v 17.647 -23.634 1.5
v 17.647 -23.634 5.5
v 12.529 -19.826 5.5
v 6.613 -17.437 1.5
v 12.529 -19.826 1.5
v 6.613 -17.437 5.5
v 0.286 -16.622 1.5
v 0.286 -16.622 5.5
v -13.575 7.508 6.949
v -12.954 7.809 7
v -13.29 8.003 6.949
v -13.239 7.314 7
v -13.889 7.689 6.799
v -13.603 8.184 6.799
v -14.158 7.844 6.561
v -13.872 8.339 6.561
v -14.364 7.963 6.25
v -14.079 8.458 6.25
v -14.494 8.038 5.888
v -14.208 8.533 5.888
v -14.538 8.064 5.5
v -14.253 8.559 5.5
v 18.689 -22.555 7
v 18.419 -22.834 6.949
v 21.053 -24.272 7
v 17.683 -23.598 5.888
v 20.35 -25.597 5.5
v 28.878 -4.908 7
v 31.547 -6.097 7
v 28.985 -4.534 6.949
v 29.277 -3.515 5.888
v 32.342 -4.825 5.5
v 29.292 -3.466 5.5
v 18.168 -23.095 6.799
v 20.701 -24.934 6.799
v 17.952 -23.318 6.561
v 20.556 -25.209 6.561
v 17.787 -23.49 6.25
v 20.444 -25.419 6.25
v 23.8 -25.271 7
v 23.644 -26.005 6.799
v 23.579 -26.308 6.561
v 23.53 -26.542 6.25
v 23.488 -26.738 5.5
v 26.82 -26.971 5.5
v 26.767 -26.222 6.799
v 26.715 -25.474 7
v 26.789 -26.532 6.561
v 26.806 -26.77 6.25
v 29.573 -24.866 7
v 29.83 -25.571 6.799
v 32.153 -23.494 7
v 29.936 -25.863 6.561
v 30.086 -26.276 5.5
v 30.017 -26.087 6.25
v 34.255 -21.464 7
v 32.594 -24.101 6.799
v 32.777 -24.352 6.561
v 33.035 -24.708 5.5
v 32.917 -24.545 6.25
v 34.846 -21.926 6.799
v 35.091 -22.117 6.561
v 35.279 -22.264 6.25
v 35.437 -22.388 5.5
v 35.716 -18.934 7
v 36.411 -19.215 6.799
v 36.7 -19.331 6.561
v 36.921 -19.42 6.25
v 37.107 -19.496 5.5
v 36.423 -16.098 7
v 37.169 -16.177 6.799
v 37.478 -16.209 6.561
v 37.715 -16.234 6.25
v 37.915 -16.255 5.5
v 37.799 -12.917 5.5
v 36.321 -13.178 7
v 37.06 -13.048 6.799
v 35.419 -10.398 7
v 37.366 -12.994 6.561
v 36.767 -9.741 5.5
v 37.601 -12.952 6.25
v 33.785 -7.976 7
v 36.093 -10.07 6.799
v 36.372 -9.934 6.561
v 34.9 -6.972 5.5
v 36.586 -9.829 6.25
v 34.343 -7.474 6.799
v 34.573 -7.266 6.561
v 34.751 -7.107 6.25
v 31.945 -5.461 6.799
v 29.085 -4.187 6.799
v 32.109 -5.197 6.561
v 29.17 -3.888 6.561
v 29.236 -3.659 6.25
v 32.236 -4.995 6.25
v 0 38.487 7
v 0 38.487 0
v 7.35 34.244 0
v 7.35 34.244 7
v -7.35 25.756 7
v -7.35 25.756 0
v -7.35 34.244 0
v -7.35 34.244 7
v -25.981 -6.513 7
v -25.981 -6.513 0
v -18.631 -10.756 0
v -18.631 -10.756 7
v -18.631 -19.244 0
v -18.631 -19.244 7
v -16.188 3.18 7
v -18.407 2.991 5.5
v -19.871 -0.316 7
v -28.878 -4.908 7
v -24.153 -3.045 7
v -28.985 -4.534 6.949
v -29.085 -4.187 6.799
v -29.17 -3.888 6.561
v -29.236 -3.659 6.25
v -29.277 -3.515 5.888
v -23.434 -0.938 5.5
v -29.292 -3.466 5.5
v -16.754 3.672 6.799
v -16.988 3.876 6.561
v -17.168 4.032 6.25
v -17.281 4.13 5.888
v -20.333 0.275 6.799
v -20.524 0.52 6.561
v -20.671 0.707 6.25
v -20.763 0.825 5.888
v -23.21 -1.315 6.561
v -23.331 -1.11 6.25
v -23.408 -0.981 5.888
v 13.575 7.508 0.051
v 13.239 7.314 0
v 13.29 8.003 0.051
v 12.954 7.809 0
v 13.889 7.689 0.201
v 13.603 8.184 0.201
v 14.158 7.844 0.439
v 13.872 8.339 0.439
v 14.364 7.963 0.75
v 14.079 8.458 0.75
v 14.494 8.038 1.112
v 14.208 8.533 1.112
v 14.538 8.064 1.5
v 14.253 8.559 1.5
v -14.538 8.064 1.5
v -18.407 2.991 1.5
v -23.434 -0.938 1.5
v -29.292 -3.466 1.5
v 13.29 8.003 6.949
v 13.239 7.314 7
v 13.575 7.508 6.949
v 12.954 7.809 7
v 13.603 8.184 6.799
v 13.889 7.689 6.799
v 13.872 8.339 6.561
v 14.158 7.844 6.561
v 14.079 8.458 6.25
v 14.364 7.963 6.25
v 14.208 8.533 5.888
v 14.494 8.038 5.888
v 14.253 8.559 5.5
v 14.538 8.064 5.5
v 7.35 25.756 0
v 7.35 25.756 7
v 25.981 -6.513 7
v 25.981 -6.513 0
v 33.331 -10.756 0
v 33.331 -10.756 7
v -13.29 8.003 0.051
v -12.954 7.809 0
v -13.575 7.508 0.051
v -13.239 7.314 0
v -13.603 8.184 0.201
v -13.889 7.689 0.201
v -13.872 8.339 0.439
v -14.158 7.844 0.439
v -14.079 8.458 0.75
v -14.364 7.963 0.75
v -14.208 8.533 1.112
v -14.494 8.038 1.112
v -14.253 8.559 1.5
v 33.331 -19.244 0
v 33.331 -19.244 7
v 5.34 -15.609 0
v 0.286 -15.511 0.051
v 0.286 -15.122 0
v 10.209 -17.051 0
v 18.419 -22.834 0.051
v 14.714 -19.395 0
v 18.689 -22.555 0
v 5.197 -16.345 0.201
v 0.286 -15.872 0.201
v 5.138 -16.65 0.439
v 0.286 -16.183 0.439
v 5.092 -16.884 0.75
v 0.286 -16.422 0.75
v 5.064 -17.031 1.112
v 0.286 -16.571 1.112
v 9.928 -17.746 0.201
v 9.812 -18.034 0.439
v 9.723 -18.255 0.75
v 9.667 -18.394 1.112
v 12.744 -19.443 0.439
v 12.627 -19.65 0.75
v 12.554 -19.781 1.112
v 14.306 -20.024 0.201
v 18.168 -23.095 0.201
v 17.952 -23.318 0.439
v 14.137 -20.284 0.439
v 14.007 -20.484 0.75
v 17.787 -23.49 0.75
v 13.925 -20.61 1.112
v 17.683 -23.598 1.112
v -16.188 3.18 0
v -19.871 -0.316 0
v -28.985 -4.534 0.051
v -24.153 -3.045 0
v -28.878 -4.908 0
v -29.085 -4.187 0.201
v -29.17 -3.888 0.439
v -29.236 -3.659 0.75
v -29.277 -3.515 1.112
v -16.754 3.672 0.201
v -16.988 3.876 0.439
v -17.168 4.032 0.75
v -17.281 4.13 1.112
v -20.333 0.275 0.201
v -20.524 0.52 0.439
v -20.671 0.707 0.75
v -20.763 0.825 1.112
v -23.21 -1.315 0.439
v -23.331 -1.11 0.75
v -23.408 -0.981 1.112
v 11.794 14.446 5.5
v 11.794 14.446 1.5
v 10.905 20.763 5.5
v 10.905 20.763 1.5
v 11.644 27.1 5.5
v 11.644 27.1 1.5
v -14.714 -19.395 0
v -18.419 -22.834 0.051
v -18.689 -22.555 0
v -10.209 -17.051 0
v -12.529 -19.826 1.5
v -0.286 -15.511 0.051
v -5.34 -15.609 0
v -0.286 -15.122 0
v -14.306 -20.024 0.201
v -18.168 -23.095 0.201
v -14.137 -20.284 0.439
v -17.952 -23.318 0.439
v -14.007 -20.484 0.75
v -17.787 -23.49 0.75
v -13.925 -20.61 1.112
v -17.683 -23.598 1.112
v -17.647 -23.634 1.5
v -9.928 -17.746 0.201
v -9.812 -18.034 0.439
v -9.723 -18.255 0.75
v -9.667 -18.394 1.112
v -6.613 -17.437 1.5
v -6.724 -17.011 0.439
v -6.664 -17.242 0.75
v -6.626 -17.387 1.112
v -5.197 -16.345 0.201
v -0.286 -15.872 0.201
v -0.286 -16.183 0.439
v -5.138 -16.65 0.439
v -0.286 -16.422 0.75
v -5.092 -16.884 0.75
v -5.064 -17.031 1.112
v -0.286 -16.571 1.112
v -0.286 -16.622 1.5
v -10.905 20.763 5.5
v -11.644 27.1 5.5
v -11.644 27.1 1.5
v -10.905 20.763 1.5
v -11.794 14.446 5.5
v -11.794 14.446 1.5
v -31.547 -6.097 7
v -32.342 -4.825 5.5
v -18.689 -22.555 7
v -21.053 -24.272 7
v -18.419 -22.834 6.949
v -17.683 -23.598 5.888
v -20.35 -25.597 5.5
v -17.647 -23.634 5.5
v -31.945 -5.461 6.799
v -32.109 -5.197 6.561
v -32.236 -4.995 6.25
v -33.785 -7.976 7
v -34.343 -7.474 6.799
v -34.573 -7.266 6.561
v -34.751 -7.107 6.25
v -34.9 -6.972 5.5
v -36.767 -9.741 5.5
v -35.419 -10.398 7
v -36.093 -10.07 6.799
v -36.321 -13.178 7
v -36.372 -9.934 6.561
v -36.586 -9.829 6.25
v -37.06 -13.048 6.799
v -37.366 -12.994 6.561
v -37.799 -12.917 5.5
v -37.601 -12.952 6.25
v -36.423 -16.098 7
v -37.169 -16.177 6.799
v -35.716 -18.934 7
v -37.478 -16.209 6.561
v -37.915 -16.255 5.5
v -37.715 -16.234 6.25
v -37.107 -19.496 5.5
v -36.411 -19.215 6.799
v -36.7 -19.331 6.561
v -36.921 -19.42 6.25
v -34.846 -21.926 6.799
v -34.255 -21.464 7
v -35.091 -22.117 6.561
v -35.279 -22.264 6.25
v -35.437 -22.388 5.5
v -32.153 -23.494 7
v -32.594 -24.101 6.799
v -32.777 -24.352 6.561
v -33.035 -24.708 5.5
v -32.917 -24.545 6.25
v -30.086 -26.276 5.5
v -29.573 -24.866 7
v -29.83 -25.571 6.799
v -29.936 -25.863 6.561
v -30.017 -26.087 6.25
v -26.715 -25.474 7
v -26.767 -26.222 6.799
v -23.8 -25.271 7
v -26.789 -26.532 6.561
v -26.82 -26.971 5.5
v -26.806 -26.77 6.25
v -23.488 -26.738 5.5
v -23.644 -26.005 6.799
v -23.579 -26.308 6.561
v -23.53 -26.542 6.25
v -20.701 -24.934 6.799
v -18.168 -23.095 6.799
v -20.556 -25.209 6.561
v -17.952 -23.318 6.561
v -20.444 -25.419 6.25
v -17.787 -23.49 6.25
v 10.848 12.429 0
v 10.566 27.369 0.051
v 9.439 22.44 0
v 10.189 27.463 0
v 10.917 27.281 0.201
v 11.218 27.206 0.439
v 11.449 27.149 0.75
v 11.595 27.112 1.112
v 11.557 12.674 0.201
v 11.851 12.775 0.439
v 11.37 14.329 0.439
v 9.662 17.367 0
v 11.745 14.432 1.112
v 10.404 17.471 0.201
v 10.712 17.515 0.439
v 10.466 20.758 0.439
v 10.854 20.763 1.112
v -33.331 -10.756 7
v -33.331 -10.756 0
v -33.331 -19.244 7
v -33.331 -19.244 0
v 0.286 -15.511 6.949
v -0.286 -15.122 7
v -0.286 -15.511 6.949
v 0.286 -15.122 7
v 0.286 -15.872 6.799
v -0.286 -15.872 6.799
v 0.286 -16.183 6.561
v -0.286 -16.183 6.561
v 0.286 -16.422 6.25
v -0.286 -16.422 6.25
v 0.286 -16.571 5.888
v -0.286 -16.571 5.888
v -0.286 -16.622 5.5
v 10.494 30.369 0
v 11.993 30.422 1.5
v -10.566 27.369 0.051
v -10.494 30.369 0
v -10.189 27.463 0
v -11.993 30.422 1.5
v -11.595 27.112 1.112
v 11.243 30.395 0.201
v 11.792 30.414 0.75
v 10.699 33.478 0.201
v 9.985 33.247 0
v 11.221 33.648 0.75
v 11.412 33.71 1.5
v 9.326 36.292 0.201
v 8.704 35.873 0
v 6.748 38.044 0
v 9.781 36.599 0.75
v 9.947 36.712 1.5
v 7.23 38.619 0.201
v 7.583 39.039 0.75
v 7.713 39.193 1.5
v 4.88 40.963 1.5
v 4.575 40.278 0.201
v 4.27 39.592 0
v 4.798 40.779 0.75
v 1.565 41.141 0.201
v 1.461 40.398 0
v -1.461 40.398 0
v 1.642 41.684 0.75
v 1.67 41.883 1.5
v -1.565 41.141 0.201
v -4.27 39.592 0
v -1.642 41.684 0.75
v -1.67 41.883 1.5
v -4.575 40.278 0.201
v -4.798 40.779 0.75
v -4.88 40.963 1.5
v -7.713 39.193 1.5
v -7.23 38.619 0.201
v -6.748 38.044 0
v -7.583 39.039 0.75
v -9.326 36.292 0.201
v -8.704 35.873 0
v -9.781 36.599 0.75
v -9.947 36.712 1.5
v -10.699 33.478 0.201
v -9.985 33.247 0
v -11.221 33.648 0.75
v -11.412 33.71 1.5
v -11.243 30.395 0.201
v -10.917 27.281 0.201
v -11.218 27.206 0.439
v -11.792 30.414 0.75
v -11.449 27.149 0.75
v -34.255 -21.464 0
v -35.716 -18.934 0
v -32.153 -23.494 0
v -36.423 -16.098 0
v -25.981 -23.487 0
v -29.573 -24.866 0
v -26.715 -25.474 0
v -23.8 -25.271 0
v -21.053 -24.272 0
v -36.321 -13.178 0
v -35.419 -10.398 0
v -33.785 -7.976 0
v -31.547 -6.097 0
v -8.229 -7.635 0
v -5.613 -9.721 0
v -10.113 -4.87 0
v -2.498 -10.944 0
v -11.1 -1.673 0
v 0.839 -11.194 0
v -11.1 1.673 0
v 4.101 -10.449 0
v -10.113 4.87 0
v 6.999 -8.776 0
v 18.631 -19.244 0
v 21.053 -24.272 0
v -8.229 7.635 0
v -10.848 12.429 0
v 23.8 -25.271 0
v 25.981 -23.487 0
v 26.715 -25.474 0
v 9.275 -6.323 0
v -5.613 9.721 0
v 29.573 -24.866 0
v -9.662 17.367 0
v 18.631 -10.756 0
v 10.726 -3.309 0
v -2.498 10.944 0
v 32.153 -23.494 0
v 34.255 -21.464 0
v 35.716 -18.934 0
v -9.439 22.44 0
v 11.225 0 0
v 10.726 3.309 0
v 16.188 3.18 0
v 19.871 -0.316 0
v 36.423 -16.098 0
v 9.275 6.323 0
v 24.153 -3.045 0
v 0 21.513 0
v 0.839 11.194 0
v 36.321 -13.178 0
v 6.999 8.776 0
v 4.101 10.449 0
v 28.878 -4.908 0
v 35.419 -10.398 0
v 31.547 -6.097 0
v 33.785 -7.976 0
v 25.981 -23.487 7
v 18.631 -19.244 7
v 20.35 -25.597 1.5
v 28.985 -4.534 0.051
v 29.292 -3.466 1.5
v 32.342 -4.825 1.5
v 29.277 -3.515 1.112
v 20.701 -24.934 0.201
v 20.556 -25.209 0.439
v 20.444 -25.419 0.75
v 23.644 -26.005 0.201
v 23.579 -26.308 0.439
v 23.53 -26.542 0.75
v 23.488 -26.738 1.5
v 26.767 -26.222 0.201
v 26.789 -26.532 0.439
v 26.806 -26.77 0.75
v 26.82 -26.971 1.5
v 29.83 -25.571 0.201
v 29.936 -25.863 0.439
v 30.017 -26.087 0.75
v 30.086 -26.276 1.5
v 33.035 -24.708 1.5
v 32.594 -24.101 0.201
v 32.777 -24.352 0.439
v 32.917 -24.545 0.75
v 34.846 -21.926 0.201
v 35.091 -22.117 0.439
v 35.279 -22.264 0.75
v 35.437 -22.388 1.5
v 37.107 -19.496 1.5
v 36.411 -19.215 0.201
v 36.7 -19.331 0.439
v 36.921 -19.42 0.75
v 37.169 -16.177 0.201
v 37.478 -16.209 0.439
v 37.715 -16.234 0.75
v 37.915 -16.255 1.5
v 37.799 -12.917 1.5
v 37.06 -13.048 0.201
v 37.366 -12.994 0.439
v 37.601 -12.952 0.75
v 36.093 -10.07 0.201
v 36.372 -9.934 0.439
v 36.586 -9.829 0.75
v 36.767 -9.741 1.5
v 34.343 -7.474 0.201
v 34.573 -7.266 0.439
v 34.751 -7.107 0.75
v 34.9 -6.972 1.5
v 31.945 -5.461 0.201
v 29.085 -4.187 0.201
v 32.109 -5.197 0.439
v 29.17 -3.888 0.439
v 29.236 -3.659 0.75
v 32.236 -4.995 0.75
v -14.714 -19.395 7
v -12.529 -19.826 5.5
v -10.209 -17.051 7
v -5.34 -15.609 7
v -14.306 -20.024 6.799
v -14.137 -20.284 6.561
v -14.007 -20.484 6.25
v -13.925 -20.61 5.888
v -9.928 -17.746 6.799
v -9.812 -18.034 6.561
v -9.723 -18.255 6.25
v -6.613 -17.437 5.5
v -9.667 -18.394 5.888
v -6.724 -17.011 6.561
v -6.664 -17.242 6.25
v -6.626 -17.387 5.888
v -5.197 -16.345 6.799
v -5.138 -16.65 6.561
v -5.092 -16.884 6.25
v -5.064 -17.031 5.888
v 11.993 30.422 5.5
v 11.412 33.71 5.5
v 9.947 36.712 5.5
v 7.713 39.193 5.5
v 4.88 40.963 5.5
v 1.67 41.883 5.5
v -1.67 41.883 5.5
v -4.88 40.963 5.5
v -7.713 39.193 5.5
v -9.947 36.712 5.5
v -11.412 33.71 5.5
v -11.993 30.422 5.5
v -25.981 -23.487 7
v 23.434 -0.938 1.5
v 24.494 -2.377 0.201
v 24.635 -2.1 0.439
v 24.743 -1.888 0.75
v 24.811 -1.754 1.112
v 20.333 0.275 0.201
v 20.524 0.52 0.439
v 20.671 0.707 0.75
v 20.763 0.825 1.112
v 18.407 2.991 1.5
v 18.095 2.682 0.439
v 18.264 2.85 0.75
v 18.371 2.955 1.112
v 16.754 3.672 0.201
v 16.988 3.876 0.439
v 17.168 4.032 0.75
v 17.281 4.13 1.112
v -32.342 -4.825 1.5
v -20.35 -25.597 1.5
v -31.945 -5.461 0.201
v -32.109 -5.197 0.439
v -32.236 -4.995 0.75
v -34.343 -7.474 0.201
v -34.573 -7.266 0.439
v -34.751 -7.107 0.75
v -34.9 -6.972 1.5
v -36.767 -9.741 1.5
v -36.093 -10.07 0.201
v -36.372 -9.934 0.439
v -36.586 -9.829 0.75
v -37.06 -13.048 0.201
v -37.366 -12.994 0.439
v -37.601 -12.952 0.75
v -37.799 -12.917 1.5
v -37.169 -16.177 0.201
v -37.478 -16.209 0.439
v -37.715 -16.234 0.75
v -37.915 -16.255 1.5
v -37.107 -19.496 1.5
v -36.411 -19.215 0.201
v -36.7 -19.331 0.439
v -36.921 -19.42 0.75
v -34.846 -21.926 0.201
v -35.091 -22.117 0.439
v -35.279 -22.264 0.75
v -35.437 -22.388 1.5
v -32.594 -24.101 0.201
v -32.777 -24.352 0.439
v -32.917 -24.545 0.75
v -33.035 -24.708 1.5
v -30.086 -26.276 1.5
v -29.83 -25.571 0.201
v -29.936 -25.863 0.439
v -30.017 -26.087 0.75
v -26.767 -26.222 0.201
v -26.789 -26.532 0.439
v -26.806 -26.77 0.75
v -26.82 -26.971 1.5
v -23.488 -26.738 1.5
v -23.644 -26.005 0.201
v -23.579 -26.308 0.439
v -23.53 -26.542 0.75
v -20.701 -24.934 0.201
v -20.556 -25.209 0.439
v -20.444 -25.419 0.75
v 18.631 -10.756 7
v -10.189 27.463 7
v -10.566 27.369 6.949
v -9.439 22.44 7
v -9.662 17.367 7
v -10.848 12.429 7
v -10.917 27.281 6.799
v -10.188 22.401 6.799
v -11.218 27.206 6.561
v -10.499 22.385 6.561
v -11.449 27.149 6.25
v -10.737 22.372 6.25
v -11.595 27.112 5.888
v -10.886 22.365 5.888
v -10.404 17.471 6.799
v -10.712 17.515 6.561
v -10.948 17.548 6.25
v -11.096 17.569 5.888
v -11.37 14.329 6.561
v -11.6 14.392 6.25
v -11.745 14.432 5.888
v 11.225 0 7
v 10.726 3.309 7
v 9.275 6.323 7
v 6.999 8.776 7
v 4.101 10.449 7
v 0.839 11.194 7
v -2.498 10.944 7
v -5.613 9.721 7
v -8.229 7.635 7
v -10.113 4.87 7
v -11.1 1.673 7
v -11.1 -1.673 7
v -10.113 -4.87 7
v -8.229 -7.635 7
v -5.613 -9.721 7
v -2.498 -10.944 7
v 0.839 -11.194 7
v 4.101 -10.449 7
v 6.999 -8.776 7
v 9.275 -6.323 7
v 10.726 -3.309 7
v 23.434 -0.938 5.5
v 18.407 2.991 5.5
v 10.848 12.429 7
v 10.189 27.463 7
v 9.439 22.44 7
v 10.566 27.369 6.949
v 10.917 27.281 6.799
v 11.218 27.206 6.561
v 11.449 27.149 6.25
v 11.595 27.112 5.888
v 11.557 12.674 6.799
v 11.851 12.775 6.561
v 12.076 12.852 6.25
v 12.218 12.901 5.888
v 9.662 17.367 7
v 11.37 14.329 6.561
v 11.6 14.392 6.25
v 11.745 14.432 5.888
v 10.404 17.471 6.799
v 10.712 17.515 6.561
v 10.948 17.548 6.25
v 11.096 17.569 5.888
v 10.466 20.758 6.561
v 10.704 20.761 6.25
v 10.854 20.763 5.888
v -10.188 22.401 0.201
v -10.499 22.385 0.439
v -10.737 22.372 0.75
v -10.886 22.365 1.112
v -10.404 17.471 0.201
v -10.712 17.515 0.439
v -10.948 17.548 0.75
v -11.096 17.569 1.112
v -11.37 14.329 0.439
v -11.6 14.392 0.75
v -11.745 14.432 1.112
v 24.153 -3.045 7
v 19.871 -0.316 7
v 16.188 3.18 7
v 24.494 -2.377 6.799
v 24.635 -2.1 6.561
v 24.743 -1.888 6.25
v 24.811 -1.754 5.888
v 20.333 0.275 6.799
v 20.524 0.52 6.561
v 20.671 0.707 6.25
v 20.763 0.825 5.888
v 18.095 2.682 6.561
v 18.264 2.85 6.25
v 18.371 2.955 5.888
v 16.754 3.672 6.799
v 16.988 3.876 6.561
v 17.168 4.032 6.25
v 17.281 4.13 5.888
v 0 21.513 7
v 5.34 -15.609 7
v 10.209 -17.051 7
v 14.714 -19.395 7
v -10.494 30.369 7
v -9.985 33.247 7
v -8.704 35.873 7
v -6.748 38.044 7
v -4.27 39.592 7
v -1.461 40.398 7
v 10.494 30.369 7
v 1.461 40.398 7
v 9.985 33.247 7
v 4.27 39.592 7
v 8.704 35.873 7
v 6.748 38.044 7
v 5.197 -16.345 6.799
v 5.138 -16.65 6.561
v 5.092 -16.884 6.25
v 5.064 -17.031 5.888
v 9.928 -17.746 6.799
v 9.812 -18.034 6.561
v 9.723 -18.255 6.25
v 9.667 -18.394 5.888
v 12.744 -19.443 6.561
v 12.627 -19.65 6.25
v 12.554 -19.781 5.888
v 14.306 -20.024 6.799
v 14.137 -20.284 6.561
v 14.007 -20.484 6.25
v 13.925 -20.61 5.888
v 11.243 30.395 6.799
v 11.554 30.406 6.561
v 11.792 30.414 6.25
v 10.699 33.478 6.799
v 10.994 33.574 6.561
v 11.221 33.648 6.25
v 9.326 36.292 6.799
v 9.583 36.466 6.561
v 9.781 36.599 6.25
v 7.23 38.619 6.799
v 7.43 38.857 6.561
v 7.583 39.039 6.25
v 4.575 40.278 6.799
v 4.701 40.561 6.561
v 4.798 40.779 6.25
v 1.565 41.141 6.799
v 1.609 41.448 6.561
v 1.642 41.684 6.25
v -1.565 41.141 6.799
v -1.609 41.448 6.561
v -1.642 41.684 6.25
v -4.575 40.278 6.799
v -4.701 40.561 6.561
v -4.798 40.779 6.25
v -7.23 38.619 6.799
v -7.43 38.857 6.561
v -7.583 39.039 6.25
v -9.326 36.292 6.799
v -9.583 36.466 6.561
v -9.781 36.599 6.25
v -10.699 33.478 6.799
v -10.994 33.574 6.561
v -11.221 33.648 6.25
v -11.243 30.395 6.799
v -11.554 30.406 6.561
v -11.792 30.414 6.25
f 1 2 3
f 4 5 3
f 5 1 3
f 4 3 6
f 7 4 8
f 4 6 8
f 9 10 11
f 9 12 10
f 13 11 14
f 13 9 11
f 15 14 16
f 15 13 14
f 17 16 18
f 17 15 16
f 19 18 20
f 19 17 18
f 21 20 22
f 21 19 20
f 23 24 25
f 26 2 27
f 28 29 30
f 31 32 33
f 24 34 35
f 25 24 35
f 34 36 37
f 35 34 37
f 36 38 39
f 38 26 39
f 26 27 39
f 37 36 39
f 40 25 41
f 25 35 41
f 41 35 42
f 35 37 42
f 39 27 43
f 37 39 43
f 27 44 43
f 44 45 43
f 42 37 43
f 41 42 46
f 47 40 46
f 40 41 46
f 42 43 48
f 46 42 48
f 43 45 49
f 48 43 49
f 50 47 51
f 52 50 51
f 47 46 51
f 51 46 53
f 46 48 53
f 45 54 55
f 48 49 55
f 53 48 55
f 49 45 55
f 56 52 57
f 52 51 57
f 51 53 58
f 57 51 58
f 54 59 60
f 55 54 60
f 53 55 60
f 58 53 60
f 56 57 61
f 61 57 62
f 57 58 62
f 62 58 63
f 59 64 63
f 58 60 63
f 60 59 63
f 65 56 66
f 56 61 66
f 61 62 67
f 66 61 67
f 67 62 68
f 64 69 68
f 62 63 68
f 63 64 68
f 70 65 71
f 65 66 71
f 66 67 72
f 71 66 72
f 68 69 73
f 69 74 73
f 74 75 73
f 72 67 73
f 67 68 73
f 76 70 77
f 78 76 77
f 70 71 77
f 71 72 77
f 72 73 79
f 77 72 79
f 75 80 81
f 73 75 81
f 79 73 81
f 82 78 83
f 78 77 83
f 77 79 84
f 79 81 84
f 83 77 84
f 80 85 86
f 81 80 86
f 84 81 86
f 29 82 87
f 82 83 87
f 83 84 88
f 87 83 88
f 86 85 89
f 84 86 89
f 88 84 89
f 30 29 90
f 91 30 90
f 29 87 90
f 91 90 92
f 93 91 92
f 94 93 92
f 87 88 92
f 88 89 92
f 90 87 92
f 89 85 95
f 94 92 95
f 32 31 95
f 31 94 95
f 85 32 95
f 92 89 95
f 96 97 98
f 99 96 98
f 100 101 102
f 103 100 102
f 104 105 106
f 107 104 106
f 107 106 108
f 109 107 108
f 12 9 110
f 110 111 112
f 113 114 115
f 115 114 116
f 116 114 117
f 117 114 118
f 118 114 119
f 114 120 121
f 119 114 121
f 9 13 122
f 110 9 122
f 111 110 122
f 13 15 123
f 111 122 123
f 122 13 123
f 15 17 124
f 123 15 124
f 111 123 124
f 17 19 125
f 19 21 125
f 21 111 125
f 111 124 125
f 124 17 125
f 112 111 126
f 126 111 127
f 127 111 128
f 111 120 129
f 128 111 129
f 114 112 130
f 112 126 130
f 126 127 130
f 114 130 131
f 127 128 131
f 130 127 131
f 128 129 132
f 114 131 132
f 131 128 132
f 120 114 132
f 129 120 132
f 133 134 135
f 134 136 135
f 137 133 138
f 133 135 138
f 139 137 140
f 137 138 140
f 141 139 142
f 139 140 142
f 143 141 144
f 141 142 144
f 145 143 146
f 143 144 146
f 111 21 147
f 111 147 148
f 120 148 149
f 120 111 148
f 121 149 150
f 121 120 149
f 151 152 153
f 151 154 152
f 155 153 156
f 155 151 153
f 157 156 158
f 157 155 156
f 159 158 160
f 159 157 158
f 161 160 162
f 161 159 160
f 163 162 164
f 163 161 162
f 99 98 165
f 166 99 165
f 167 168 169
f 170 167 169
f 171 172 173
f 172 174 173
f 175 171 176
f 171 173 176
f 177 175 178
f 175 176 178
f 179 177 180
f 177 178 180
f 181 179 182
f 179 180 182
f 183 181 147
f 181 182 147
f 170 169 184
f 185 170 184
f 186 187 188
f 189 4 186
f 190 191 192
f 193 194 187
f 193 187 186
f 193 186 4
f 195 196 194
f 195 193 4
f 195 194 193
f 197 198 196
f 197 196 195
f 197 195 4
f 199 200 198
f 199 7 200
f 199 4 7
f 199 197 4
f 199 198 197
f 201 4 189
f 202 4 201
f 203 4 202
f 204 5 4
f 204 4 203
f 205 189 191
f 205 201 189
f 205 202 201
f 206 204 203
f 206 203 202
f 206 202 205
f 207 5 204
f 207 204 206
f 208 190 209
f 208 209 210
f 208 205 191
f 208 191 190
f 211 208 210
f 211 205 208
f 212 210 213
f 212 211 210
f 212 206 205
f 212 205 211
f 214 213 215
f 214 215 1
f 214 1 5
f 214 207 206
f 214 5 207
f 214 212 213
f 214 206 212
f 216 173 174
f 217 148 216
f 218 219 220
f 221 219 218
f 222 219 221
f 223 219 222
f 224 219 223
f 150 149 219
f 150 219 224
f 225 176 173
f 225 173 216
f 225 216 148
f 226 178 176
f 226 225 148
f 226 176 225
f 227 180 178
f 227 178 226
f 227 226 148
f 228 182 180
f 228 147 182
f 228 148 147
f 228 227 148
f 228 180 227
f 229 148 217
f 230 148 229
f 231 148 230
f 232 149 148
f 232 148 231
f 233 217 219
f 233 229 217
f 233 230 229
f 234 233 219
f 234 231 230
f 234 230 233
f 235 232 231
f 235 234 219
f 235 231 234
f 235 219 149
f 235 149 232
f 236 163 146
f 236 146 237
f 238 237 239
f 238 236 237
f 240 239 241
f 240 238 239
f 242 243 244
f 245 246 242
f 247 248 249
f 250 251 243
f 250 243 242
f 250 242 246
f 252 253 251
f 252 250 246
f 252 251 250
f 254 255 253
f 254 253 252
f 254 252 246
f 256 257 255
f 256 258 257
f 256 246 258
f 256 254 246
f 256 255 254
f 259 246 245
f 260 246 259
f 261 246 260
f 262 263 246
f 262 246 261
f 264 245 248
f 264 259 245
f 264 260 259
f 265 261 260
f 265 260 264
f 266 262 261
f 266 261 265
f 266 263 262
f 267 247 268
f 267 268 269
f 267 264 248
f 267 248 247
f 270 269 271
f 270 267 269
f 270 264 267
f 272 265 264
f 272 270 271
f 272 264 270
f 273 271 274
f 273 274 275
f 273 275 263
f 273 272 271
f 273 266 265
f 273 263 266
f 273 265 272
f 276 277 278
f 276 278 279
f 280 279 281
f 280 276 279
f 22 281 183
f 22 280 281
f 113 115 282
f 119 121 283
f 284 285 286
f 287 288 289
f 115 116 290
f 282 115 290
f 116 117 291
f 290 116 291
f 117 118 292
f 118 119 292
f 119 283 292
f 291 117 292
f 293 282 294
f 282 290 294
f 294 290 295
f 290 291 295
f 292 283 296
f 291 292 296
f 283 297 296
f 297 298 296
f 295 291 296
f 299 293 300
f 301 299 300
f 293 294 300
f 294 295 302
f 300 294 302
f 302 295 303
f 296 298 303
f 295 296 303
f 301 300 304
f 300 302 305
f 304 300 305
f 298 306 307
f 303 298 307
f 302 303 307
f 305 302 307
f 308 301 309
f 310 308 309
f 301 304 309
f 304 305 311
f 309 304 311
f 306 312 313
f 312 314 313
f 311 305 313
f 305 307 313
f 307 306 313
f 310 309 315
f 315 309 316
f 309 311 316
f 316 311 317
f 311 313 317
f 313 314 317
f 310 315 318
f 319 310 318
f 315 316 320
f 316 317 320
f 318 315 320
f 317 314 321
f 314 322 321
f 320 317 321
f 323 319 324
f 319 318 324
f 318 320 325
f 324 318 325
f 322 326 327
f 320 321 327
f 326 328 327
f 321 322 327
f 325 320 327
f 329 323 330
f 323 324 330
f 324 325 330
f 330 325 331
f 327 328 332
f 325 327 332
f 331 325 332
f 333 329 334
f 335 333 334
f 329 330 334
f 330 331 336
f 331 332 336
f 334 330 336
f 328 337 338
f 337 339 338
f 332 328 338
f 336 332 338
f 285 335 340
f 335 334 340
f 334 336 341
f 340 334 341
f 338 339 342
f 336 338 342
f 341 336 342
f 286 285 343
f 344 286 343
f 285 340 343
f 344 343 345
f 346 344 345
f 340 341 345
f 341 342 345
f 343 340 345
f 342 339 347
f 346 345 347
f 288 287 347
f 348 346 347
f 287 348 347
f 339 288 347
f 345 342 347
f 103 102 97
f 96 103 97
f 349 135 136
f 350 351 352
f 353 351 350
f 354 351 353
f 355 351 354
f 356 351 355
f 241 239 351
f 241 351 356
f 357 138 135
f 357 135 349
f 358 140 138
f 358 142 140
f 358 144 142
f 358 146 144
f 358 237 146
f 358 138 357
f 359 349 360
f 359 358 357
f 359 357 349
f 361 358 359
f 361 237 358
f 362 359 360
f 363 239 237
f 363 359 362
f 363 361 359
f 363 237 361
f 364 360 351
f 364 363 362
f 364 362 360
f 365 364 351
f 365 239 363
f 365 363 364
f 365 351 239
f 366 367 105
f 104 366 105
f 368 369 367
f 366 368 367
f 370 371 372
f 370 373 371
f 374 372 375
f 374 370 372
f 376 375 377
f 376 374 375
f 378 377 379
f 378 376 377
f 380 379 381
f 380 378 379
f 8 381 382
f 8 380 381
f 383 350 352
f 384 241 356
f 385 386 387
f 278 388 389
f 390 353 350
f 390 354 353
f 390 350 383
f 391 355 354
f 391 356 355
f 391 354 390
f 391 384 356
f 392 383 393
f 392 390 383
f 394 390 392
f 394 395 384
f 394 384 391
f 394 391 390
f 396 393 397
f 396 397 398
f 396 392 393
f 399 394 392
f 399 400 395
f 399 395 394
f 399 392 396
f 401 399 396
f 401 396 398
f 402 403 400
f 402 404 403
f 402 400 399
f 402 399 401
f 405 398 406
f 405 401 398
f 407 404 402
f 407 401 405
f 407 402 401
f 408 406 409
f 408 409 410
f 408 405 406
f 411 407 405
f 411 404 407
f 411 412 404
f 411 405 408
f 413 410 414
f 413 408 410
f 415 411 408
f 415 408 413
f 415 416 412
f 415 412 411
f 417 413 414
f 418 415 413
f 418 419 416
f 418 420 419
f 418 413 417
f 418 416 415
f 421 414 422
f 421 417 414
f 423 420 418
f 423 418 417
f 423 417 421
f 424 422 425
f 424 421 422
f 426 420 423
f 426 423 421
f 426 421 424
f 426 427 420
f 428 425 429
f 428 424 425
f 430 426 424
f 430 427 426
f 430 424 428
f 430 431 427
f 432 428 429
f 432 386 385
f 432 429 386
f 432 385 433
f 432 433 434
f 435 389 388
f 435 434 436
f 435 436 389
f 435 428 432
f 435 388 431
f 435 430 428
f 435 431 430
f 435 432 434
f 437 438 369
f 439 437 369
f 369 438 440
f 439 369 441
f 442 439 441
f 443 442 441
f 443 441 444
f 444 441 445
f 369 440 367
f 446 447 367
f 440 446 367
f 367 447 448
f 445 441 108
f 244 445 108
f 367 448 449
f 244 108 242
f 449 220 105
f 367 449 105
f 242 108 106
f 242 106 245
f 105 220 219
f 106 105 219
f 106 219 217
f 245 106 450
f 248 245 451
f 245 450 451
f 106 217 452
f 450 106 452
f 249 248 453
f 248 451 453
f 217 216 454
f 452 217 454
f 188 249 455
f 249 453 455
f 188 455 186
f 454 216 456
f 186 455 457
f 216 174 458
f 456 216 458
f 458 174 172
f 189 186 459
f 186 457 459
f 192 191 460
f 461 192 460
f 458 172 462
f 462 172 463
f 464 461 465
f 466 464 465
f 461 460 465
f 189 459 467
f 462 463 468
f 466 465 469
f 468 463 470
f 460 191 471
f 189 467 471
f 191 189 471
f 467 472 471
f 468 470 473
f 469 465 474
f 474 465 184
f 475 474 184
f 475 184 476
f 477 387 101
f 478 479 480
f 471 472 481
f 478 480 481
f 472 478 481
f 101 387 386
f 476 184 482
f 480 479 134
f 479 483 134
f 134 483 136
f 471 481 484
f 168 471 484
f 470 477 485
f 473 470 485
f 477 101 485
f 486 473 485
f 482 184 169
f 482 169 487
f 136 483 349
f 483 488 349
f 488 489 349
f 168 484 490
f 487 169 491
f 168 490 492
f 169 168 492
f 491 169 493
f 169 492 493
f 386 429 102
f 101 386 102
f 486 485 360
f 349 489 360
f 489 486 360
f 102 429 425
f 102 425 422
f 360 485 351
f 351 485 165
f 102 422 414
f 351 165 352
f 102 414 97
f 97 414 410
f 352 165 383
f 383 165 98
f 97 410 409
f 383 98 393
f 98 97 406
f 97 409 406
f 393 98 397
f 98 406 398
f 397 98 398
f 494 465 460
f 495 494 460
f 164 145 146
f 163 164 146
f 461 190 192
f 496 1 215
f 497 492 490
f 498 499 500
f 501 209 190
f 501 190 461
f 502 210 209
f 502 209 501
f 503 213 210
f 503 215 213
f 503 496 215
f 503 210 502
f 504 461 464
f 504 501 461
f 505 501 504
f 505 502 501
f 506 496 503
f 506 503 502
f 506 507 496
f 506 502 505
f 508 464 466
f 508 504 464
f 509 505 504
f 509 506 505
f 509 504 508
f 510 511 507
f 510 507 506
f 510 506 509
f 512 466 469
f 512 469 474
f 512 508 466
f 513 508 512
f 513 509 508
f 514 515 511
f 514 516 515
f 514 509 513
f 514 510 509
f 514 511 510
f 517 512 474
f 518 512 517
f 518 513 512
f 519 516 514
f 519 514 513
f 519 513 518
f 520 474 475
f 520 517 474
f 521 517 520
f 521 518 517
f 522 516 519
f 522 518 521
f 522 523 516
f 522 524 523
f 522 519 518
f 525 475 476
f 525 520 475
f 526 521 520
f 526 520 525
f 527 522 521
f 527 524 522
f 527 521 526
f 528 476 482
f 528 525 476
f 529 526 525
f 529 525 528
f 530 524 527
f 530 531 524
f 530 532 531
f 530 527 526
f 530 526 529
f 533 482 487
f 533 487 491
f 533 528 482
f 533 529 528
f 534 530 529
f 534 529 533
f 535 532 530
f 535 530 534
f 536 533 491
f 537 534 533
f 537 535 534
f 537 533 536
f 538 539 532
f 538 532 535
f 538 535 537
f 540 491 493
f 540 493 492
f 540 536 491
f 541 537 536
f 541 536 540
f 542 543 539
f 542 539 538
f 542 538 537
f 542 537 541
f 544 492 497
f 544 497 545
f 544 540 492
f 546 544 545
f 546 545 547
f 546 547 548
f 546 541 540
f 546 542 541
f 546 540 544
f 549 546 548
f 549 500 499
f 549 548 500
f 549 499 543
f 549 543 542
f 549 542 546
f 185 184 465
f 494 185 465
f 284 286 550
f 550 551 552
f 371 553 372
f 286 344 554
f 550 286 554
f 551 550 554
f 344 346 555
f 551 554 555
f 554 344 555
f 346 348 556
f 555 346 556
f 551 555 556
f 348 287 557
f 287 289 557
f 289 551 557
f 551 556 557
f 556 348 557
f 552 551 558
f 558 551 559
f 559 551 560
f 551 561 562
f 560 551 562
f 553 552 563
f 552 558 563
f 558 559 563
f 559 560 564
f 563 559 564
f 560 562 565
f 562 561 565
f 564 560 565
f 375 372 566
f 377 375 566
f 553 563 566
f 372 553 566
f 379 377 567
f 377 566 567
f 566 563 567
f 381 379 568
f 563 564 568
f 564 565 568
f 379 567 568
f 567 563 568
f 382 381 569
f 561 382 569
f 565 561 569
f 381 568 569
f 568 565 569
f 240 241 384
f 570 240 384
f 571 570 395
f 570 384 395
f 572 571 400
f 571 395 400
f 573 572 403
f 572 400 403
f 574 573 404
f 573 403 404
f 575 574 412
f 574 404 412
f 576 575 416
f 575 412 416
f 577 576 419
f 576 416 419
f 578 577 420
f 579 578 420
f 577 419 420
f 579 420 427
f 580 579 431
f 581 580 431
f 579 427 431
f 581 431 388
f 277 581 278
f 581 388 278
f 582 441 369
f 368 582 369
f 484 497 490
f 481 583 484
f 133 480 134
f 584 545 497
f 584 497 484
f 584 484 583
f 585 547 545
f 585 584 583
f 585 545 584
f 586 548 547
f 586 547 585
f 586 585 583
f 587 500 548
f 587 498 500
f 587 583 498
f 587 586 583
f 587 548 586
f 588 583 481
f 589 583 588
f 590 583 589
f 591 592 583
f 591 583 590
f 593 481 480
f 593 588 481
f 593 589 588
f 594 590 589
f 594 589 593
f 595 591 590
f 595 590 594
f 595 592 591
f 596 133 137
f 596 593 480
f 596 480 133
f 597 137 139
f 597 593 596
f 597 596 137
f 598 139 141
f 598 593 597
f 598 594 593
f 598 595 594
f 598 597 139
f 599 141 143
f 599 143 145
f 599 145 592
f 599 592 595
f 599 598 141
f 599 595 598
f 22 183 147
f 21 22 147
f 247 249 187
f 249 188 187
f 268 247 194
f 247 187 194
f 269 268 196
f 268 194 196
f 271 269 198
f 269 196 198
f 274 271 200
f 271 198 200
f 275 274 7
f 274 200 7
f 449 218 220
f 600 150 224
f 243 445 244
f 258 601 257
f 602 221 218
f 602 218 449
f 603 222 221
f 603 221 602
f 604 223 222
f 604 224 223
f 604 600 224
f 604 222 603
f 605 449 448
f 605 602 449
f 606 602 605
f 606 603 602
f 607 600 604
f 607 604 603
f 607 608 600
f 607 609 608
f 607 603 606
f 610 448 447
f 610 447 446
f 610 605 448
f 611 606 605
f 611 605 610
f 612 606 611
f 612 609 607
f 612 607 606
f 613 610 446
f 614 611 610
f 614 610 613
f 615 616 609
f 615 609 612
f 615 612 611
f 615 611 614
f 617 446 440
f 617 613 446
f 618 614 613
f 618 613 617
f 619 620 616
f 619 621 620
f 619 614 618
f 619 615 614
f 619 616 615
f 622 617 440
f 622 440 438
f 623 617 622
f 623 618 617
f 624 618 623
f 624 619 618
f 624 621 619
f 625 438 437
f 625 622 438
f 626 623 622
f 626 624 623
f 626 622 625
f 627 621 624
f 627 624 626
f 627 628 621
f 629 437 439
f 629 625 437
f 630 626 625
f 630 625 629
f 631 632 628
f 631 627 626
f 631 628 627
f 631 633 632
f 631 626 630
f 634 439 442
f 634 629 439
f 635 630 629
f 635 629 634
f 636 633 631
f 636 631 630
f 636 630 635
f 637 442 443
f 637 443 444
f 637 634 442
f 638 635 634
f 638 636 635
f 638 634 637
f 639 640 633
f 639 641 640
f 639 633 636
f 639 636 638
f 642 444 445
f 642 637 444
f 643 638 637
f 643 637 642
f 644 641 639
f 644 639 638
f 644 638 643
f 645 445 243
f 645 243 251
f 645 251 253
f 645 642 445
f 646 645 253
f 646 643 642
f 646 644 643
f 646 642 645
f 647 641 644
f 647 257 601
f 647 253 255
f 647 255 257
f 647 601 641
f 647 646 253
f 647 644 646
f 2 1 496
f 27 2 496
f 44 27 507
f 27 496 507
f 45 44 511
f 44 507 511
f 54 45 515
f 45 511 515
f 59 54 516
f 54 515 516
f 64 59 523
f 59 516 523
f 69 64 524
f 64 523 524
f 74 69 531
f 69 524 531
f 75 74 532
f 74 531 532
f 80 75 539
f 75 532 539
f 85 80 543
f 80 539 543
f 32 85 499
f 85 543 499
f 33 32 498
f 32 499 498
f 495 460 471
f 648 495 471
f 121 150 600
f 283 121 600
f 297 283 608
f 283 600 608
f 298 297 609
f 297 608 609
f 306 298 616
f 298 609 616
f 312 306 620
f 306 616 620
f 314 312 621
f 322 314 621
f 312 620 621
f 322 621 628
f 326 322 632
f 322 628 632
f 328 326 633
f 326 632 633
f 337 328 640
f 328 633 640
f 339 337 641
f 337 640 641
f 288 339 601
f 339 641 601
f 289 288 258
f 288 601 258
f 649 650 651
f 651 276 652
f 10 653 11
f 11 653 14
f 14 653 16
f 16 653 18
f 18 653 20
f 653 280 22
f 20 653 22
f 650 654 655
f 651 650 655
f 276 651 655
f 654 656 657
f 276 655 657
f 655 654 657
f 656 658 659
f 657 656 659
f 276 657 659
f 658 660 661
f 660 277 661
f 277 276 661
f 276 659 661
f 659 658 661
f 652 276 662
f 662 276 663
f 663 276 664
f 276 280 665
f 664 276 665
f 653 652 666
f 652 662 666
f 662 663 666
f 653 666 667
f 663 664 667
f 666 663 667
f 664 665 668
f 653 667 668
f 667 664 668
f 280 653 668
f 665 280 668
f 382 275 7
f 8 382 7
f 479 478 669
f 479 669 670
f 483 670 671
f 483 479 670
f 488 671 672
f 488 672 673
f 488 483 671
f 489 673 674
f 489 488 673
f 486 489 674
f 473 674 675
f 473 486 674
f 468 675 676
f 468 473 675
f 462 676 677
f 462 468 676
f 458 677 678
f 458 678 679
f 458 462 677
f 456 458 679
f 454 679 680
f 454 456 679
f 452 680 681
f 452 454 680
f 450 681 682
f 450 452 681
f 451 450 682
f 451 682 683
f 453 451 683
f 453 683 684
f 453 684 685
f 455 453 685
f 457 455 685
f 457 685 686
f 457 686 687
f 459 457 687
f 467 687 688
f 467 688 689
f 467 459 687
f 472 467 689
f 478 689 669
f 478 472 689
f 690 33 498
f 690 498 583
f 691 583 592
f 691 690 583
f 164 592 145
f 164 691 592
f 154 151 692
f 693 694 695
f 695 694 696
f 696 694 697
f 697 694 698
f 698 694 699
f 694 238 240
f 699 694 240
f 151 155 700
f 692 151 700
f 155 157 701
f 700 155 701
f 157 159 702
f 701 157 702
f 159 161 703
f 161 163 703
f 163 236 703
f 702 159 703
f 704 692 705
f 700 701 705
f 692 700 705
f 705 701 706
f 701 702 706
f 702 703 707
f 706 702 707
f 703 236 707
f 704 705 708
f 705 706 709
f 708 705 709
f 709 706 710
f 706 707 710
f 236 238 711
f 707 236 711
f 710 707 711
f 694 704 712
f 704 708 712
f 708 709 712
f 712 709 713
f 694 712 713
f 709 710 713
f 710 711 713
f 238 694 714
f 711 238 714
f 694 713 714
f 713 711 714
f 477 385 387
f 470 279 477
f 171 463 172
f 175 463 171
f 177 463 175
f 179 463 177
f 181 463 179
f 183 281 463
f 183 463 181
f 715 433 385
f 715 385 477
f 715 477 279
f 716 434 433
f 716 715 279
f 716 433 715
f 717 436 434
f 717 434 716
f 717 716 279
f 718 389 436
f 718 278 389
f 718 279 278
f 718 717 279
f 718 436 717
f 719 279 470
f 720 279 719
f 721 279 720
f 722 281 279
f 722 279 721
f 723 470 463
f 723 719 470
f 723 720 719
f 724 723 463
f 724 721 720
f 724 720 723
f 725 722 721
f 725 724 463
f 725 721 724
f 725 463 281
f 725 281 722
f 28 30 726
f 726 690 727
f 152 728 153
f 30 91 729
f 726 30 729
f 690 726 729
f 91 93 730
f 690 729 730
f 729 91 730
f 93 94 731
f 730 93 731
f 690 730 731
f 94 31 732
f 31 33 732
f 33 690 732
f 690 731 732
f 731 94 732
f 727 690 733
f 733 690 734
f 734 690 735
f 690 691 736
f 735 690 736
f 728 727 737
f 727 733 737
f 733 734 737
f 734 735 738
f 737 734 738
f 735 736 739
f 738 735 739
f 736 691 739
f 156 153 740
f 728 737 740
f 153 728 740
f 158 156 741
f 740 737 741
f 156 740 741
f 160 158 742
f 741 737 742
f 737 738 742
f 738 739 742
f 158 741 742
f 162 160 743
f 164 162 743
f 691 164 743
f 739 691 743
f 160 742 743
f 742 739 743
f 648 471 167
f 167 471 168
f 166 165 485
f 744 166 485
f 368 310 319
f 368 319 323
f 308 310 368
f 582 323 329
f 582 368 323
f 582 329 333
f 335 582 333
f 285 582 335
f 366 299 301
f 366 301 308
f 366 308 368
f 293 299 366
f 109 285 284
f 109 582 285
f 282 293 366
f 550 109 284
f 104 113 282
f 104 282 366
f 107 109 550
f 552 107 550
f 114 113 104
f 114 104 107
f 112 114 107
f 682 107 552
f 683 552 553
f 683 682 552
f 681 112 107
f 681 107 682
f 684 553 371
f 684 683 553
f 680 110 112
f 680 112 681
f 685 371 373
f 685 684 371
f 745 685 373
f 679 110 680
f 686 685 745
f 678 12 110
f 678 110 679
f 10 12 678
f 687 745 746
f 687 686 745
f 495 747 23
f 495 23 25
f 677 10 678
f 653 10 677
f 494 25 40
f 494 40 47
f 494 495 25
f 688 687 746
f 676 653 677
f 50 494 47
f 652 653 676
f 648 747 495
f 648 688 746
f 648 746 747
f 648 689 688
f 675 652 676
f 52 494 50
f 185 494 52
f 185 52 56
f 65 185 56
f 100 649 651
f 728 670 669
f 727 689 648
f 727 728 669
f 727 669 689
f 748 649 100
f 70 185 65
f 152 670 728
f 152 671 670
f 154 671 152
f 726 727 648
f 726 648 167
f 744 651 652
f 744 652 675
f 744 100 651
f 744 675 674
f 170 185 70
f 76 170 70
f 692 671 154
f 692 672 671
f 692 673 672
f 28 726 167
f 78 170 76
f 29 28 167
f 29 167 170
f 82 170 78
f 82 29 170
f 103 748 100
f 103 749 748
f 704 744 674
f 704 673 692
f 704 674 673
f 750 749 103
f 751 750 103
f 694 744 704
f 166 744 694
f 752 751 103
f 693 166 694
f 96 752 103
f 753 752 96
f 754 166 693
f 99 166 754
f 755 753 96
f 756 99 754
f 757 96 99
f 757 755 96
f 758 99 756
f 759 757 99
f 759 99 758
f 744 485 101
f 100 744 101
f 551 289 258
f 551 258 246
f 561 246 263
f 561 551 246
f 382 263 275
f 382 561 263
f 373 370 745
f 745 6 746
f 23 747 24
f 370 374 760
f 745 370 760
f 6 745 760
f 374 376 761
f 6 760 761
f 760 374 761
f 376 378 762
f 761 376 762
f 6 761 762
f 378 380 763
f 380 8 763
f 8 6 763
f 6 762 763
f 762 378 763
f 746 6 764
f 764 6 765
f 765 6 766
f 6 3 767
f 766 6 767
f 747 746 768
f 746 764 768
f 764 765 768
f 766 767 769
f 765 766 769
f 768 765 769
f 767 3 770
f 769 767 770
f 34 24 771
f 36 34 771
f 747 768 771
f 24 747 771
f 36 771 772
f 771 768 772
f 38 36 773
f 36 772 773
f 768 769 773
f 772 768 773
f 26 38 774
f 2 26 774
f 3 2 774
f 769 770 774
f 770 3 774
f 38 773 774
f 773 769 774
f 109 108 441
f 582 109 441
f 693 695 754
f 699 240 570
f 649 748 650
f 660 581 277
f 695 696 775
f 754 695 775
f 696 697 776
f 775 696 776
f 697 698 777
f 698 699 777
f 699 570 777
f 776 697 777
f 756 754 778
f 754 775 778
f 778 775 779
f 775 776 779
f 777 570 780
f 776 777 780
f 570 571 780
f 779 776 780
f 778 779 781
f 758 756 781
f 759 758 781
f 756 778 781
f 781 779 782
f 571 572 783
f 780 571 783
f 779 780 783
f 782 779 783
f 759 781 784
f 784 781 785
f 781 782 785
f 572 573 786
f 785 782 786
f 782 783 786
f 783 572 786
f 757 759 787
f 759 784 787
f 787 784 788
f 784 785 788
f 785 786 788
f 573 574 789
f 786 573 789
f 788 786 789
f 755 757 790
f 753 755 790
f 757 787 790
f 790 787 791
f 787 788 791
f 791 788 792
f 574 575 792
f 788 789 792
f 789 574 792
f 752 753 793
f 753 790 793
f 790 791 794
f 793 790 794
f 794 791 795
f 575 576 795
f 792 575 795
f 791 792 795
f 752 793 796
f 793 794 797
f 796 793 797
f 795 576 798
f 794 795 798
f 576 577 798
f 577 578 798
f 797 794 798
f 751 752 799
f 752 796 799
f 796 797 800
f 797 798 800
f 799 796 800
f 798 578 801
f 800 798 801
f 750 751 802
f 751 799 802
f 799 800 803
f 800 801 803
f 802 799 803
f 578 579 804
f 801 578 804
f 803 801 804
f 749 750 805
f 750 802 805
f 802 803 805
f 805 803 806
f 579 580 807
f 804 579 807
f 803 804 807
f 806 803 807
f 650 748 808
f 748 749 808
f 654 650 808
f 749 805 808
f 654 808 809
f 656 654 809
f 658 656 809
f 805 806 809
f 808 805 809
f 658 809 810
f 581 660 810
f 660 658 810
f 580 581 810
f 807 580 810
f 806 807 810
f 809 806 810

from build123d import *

# Parameters (mm, degrees)
F0_R     = 11.225
F1_DEPTH = 7
F2_R     = 25
F3_R     = 1.5


with BuildPart() as f1:
    # F0 (on Top) → F1 (new body)
    with BuildSketch(Plane.XY):
        with BuildLine():
            Line((-14.0909507949, -16.6224631917), (-8.8518149883, -13.5976467234))
            ThreePointArc((-8.8518149883, -13.5976467234), (0, -16.225), (8.8518149883, -13.5976467234))
            Line((8.8518149883, -13.5976467234), (14.0909507949, -16.6224631917))
            ThreePointArc((14.0909507949, -16.6224631917), (36.3730669589, -21), (21.4409507949, -3.8918897561))
            Line((21.4409507949, -3.8918897561), (16.2018149883, -0.8670732877))
            ThreePointArc((16.2018149883, -0.8670732877), (14.0512621764, 8.1125), (7.35, 14.4647200111))
            Line((7.35, 14.4647200111), (7.35, 20.5143529477))
            ThreePointArc((7.35, 20.5143529477), (0, 42), (-7.35, 20.5143529477))
            Line((-7.35, 20.5143529477), (-7.35, 14.4647200111))
            ThreePointArc((-7.35, 14.4647200111), (-14.0512621764, 8.1125), (-16.2018149883, -0.8670732877))
            Line((-16.2018149883, -0.8670732877), (-21.4409507949, -3.8918897561))
            ThreePointArc((-21.4409507949, -3.8918897561), (-36.3730669589, -21), (-14.0909507949, -16.6224631917))
        make_face()
        Polygon((-25.9807621135, -23.4870489571), (-33.3307621135, -19.2435244785), (-33.3307621135, -10.7564755215), (-25.9807621135, -6.5129510429), (-18.6307621135, -10.7564755215), (-18.6307621135, -19.2435244785), align=None, mode=Mode.SUBTRACT)
        Circle(F0_R, mode=Mode.SUBTRACT)
        Polygon((33.3307621135, -10.7564755215), (33.3307621135, -19.2435244785), (25.9807621135, -23.4870489571), (18.6307621135, -19.2435244785), (18.6307621135, -10.7564755215), (25.9807621135, -6.5129510429), align=None, mode=Mode.SUBTRACT)
        Polygon((0, 38.4870489571), (7.35, 34.2435244785), (7.35, 25.7564755215), (0, 21.5129510429), (-7.35, 25.7564755215), (-7.35, 34.2435244785), align=None, mode=Mode.SUBTRACT)
        with BuildLine():
            Line((-7.35, 20.5143529477), (-21.4409507949, -3.8918897561))
            Line((-21.4409507949, -3.8918897561), (-16.2018149883, -0.8670732877))
            ThreePointArc((-16.2018149883, -0.8670732877), (-14.0512621764, 8.1125), (-7.35, 14.4647200111))
            Line((-7.35, 14.4647200111), (-7.35, 20.5143529477))
        make_face()
        with BuildLine():
            Line((16.2018149883, -0.8670732877), (21.4409507949, -3.8918897561))
            Line((21.4409507949, -3.8918897561), (7.35, 20.5143529477))
            Line((7.35, 20.5143529477), (7.35, 14.4647200111))
            ThreePointArc((7.35, 14.4647200111), (14.0512621764, 8.1125), (16.2018149883, -0.8670732877))
        make_face()
        with BuildLine():
            ThreePointArc((8.8518149883, -13.5976467234), (0, -16.225), (-8.8518149883, -13.5976467234))
            Line((-8.8518149883, -13.5976467234), (-14.0909507949, -16.6224631917))
            Line((-14.0909507949, -16.6224631917), (14.0909507949, -16.6224631917))
            Line((14.0909507949, -16.6224631917), (8.8518149883, -13.5976467234))
        make_face()
    extrude(amount=F1_DEPTH)

    # F2
    f2_edges = [f1.edges().sort_by_distance(p)[0] for p in [
        (-21.440951, -3.89189, 3.5),
        (7.35, 20.514353, 3.5),
        (14.090951, -16.622463, 3.5),
        (21.440951, -3.89189, 3.5),
        (-7.35, 20.514353, 3.5),
        (-14.090951, -16.622463, 3.5),
    ]]
    fillet(f2_edges, radius=F2_R)

    # F3
    f3_edges = [f1.edges().sort_by_distance(p)[0] for p in [
        (-11.147106, 17.57587, 7),
        (-20.794703, 0.865742, 7),
        (-36.373067, -21, 7),
        (-9.647597, -18.441612, 7),
        (36.373067, -21, 7),
        (20.794703, 0.865742, 7),
        (11.147106, 17.57587, 7),
        (0, 42, 7),
        (0, 42, 0),
        (-11.147106, 17.57587, 0),
        (-20.794703, 0.865742, 0),
        (-36.373067, -21, 0),
        (-9.647597, -18.441612, 0),
        (9.647597, -18.441612, 0),
        (36.373067, -21, 0),
        (20.794703, 0.865742, 0),
        (0, -16.622463, 0),
        (14.395475, 8.311232, 0),
        (11.147106, 17.57587, 0),
        (-14.395475, 8.311232, 0),
        (9.647597, -18.441612, 7),
        (0, -16.622463, 7),
        (14.395475, 8.311232, 7),
        (-14.395475, 8.311232, 7),
    ]]
    fillet(f3_edges, radius=F3_R)


solid = f1.part
